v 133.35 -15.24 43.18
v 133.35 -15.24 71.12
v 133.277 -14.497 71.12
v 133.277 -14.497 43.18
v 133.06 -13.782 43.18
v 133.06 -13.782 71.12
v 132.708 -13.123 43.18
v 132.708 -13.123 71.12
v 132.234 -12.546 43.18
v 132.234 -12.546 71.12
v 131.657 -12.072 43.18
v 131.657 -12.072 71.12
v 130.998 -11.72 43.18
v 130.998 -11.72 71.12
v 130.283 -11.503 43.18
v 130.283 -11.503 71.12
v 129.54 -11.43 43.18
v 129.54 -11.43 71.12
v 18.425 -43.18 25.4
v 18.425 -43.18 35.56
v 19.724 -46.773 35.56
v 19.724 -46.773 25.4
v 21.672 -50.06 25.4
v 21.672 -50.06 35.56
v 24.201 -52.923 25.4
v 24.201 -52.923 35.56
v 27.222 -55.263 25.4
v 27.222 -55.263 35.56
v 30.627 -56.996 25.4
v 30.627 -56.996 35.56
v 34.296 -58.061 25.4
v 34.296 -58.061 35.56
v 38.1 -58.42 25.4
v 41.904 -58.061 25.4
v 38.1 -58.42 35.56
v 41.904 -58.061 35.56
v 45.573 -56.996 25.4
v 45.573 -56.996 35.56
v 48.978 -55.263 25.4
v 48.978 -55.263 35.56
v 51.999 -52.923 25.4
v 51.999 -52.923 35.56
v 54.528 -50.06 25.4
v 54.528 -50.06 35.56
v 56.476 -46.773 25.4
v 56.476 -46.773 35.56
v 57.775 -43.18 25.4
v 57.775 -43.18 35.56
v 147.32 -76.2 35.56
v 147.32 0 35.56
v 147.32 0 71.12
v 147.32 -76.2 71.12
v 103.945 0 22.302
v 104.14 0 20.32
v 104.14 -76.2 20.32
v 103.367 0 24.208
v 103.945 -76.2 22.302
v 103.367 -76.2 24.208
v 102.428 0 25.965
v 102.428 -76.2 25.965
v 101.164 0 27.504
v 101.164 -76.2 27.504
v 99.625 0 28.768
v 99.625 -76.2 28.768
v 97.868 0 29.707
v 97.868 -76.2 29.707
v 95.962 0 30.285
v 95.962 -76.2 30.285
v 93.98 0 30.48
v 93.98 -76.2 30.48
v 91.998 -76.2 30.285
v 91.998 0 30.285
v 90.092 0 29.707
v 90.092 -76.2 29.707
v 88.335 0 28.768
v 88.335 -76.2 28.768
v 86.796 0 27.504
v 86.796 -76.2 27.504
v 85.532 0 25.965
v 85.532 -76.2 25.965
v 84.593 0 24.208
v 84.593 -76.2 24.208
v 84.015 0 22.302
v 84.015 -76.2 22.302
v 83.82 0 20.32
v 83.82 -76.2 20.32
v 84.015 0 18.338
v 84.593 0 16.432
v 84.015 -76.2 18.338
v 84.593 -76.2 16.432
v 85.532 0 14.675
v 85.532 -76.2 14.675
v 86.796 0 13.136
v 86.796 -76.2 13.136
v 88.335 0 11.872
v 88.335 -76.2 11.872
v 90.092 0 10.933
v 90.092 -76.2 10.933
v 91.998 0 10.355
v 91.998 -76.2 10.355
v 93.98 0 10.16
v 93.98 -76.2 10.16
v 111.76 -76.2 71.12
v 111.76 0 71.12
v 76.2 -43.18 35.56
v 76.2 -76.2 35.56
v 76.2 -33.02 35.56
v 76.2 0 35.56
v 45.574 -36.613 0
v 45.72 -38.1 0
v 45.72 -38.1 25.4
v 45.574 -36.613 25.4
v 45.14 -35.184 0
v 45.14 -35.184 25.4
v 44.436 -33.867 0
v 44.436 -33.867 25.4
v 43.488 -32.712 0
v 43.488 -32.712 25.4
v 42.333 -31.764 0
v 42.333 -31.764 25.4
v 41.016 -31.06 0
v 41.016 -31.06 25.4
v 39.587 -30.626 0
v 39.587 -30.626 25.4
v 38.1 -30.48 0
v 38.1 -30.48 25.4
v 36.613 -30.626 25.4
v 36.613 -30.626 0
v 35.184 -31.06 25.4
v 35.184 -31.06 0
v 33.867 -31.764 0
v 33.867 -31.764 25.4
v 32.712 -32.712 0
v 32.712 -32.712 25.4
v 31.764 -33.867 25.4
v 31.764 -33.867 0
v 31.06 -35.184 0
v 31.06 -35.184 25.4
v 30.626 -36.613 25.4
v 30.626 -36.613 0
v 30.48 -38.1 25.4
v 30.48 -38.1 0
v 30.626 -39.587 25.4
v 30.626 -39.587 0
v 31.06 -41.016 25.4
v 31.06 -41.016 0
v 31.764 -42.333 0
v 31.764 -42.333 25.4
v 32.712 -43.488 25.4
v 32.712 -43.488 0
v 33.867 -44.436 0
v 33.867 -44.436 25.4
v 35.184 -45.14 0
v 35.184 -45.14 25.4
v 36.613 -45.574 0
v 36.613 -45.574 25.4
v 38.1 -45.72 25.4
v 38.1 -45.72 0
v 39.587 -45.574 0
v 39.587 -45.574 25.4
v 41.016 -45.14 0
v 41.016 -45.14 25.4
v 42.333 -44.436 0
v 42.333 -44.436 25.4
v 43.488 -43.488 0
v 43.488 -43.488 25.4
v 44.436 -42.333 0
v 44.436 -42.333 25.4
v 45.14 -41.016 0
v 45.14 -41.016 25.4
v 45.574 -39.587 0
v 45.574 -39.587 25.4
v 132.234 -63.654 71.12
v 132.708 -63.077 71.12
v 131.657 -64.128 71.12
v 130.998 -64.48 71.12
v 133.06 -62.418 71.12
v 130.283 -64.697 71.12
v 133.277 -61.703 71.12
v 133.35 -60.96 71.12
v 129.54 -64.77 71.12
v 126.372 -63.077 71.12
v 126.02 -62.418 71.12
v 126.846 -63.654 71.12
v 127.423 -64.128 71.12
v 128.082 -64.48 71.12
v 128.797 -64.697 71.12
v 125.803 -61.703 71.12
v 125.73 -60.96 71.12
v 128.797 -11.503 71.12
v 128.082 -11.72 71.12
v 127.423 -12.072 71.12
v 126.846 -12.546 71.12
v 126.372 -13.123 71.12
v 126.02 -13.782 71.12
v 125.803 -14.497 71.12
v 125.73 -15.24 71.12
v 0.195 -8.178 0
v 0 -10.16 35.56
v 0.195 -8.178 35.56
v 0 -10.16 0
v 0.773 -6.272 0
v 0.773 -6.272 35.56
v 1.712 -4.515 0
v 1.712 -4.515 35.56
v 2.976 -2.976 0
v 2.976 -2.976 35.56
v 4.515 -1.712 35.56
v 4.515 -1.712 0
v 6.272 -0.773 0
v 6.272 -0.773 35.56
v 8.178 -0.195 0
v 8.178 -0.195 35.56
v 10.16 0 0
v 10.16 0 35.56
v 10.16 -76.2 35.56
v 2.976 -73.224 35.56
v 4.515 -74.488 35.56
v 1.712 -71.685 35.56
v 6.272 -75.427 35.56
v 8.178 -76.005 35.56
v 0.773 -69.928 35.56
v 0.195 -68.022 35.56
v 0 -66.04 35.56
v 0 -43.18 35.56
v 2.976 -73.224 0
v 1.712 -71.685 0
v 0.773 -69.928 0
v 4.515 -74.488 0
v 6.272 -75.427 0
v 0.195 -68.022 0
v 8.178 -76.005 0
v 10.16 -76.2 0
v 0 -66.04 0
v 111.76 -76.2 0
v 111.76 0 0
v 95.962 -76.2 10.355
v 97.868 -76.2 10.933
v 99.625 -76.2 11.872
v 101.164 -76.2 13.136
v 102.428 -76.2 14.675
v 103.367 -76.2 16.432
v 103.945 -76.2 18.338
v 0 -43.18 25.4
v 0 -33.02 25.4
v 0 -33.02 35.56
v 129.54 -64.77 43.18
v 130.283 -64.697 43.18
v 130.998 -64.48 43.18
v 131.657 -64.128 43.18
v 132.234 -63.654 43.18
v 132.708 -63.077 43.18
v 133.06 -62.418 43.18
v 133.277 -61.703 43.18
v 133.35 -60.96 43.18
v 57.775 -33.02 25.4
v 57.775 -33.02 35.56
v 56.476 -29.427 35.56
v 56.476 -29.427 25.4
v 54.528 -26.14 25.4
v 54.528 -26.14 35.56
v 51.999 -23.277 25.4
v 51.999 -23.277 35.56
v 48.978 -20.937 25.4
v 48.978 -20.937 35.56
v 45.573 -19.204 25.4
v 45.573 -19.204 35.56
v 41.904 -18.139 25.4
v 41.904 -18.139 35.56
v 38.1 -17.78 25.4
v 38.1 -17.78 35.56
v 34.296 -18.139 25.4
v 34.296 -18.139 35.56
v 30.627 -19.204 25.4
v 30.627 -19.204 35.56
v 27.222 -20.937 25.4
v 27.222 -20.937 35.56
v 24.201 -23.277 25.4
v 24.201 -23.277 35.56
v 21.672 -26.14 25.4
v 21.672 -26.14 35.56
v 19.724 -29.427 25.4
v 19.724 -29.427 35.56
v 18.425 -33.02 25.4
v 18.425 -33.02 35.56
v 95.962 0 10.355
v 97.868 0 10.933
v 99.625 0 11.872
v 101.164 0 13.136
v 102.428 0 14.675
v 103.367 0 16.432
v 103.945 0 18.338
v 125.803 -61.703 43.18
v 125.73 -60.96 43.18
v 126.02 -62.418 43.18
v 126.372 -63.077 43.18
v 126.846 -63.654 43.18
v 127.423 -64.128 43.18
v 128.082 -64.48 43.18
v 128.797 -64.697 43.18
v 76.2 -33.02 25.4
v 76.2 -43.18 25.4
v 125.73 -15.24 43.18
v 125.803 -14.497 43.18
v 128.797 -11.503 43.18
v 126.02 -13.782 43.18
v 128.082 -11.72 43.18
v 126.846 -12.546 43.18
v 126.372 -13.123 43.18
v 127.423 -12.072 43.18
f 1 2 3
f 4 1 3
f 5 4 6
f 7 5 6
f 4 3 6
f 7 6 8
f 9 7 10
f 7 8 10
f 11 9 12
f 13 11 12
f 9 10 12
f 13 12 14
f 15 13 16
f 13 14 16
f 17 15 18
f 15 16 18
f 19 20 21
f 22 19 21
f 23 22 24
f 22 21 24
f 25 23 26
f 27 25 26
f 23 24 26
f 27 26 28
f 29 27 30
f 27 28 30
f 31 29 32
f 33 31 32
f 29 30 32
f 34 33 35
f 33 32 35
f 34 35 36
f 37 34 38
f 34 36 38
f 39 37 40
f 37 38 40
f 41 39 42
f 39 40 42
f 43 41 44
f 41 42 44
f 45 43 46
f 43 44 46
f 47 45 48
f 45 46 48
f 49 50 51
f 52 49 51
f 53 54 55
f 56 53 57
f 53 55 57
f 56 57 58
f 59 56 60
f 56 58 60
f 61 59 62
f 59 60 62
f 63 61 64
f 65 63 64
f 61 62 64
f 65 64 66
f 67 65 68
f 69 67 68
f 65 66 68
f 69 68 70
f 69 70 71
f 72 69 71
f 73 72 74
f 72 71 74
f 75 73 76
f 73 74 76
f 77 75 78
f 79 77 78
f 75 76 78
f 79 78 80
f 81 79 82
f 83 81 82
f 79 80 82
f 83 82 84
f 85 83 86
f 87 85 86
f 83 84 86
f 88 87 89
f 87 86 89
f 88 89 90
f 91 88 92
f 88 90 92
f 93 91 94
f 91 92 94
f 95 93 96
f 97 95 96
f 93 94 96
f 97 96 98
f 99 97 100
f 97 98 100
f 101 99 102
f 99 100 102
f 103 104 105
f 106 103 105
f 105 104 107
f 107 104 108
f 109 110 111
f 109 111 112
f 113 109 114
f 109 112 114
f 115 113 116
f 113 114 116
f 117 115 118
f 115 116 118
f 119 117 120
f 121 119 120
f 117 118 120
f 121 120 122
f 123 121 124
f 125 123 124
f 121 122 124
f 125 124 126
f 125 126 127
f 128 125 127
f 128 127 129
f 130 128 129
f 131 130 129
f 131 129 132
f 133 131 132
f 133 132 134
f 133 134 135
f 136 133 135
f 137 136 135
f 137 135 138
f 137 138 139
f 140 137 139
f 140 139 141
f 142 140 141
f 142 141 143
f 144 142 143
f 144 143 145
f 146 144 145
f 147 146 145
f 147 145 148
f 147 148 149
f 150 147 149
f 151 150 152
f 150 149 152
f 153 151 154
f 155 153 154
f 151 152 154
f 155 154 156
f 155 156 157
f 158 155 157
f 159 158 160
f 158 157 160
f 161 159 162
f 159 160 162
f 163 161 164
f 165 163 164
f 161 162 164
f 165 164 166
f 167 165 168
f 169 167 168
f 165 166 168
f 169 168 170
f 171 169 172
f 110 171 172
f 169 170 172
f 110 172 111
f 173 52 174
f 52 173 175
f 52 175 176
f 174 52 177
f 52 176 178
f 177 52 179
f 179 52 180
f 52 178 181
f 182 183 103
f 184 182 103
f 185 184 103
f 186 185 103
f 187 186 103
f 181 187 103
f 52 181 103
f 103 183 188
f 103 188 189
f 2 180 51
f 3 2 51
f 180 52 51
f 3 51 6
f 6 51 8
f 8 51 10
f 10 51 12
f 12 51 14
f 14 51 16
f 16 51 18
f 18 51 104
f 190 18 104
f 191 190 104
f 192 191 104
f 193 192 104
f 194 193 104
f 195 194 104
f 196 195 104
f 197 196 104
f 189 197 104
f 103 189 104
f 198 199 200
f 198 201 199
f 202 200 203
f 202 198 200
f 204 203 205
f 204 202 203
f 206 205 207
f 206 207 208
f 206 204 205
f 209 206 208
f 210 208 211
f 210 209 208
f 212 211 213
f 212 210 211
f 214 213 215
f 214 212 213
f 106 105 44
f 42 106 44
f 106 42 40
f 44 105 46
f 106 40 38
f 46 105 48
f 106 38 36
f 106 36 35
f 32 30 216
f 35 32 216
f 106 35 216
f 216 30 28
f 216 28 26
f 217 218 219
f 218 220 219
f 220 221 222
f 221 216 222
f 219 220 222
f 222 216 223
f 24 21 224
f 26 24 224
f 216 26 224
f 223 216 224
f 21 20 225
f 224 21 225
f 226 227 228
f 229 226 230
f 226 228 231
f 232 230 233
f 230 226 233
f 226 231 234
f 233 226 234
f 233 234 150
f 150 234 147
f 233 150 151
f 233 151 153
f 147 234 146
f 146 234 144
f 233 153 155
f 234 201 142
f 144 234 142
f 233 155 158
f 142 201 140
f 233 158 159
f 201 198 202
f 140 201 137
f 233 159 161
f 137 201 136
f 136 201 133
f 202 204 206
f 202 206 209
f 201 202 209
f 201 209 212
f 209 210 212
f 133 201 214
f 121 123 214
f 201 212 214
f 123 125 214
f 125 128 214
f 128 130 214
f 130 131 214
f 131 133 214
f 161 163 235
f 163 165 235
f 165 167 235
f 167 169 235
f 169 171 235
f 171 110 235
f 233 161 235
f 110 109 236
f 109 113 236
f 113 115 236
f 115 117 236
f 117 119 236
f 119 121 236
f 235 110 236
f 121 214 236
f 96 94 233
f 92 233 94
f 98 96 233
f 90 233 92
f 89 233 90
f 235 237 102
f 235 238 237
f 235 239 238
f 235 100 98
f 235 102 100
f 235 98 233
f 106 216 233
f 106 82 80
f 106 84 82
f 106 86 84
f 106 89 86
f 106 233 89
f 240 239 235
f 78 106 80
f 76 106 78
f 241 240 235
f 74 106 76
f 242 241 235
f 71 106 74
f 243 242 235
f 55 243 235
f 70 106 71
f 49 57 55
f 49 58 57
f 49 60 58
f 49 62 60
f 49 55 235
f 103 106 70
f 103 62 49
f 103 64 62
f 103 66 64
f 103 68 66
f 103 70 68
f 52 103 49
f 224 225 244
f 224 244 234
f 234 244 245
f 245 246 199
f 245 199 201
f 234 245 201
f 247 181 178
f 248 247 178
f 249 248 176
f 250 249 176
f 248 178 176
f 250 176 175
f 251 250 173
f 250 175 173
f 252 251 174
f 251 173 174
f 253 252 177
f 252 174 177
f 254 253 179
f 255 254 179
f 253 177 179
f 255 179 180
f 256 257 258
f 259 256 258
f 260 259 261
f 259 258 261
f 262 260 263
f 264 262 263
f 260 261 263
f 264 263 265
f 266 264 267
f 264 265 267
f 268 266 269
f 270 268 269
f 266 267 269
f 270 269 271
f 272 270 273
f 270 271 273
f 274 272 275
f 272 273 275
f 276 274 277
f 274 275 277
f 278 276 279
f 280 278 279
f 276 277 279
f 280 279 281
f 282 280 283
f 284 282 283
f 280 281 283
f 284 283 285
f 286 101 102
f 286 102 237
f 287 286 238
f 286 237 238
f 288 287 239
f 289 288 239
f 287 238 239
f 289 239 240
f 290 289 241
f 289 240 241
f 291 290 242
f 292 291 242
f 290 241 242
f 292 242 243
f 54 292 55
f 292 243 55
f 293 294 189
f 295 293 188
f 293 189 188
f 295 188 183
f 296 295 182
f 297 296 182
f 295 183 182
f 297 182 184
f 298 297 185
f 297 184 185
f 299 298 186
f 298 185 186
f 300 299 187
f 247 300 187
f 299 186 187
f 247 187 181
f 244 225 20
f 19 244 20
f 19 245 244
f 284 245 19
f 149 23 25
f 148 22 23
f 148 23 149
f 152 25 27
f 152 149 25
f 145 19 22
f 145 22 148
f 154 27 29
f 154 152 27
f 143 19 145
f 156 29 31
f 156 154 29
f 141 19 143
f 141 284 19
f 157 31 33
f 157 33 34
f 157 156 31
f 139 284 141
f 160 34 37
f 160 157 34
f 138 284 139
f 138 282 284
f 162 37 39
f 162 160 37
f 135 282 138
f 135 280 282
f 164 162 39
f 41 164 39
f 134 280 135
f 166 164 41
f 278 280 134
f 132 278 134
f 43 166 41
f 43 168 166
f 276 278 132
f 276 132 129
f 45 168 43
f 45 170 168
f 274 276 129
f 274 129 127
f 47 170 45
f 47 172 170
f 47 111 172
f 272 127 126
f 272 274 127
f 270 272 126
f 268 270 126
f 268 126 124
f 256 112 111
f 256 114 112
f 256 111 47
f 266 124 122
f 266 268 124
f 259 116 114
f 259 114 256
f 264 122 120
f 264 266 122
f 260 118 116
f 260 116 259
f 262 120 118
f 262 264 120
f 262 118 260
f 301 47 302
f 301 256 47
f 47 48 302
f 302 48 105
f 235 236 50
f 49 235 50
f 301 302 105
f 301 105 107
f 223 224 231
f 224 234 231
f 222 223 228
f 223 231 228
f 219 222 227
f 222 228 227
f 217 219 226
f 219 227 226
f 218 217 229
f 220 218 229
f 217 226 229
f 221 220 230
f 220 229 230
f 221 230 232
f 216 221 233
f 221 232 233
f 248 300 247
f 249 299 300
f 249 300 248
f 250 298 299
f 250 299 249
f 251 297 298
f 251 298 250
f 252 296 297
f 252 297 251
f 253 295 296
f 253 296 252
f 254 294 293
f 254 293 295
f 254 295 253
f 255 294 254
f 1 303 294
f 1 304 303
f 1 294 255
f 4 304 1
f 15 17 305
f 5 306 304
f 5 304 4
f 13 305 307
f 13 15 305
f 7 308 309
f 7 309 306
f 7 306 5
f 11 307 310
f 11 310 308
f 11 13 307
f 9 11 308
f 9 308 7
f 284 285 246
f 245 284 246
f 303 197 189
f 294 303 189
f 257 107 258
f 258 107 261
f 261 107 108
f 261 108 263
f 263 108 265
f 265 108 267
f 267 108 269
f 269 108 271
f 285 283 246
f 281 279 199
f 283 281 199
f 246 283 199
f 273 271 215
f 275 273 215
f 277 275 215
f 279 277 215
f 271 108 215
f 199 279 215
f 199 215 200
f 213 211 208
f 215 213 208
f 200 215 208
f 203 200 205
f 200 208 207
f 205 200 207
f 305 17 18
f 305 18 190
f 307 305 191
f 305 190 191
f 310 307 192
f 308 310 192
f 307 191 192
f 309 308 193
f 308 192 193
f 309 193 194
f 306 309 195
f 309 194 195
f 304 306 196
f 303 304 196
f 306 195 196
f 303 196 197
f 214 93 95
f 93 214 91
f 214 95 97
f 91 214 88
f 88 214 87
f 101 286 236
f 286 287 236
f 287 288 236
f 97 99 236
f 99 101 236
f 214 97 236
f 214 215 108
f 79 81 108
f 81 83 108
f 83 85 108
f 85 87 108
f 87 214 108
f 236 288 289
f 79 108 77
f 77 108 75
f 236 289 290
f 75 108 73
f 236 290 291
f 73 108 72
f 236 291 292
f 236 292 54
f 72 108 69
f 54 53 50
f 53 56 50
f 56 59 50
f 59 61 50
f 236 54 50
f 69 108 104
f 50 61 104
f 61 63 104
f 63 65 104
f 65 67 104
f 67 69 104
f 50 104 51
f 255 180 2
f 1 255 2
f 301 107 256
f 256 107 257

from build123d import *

# Parameters (mm, degrees)
F1_DEPTH = 76.2
F3_DEPTH = 177.8
F5_DEPTH = 27.94
F7_DEPTH = 10.16
F8_R     = 7.62
F9_DEPTH = 152.4
F10_R    = 10.16


with BuildPart() as f1:
    # F0 (on Front) → F1 (new body)
    with BuildSketch(Plane.XZ):
        Polygon((0, 35.56), (0, 0), (111.76, 0), (147.32, 35.56), (147.32, 71.12), (111.76, 71.12), (76.2, 35.56), align=None)
    extrude(amount=F1_DEPTH)

    # F2 (on face) → F3 (cut)
    with BuildSketch(Plane.XZ.offset(76.2)):
        with BuildLine():
            ThreePointArc((104.14, 20.32), (101.1642048969, 27.5042048969), (93.98, 30.48))
            Line((93.98, 30.48), (93.98, 20.32))
            Line((93.98, 20.32), (93.98, 10.16))
            ThreePointArc((93.98, 10.16), (101.1642048969, 13.1357951031), (104.14, 20.32))
        make_face()
        with BuildLine():
            Line((93.98, 20.32), (93.98, 30.48))
            ThreePointArc((93.98, 30.48), (83.82, 20.32), (93.98, 10.16))
            Line((93.98, 10.16), (93.98, 20.32))
        make_face()
    extrude(amount=-F3_DEPTH, mode=Mode.SUBTRACT)

    # F4 (on face) → F5 (cut)
    with BuildSketch(Plane.XY.offset(71.12)):
        with BuildLine():
            ThreePointArc((133.35, -15.24), (132.2340768363, -12.5459231637), (129.54, -11.43))
            Line((129.54, -11.43), (129.54, -15.24))
            Line((129.54, -15.24), (133.35, -15.24))
        make_face()
        with BuildLine():
            Line((129.54, -15.24), (129.54, -11.43))
            ThreePointArc((129.54, -11.43), (126.8459231637, -12.5459231637), (125.73, -15.24))
            Line((125.73, -15.24), (129.54, -15.24))
        make_face()
        with BuildLine():
            Line((133.35, -15.24), (129.54, -15.24))
            Line((129.54, -15.24), (129.54, -19.05))
            ThreePointArc((129.54, -19.05), (132.2340768363, -17.9340768363), (133.35, -15.24))
        make_face()
        with BuildLine():
            Line((129.54, -19.05), (129.54, -15.24))
            Line((129.54, -15.24), (125.73, -15.24))
            ThreePointArc((125.73, -15.24), (126.8459231637, -17.9340768363), (129.54, -19.05))
        make_face()
        with BuildLine():
            Line((133.35, -60.96), (133.35, -15.24))
            ThreePointArc((133.35, -15.24), (132.2340768363, -17.9340768363), (129.54, -19.05))
            Line((129.54, -19.05), (129.54, -57.15))
            ThreePointArc((129.54, -57.15), (132.2340768363, -58.2659231637), (133.35, -60.96))
        make_face()
        with BuildLine():
            ThreePointArc((129.54, -19.05), (126.8459231637, -17.9340768363), (125.73, -15.24))
            Line((125.73, -15.24), (125.73, -60.96))
            ThreePointArc((125.73, -60.96), (126.8459231637, -58.2659231637), (129.54, -57.15))
            Line((129.54, -57.15), (129.54, -19.05))
        make_face()
        with BuildLine():
            Line((129.54, -60.96), (133.35, -60.96))
            ThreePointArc((133.35, -60.96), (132.2340768363, -58.2659231637), (129.54, -57.15))
            Line((129.54, -57.15), (129.54, -60.96))
        make_face()
        with BuildLine():
            ThreePointArc((129.54, -64.77), (132.2340768363, -63.6540768363), (133.35, -60.96))
            Line((133.35, -60.96), (129.54, -60.96))
            Line((129.54, -60.96), (129.54, -64.77))
        make_face()
        with BuildLine():
            Line((129.54, -60.96), (125.73, -60.96))
            ThreePointArc((125.73, -60.96), (126.8459231637, -63.6540768363), (129.54, -64.77))
            Line((129.54, -64.77), (129.54, -60.96))
        make_face()
        with BuildLine():
            ThreePointArc((129.54, -57.15), (126.8459231637, -58.2659231637), (125.73, -60.96))
            Line((125.73, -60.96), (129.54, -60.96))
            Line((129.54, -60.96), (129.54, -57.15))
        make_face()
    extrude(amount=-F5_DEPTH, mode=Mode.SUBTRACT)

    # F6 (on face) → F7 (cut)
    with BuildSketch(Plane.XY.offset(35.56)):
        with BuildLine():
            Line((18.4252446013, -33.02), (0, -33.02))
            Line((0, -33.02), (0, -38.1))
            Line((0, -38.1), (17.78, -38.1))
            ThreePointArc((17.78, -38.1), (17.9419565719, -35.5395927768), (18.4252446013, -33.02))
        make_face()
        with BuildLine():
            Line((17.78, -38.1), (0, -38.1))
            Line((0, -38.1), (0, -43.18))
            Line((0, -43.18), (18.4252446013, -43.18))
            ThreePointArc((18.4252446013, -43.18), (17.9419565719, -40.6604072232), (17.78, -38.1))
        make_face()
        with BuildLine():
            ThreePointArc((57.7747553987, -33.02), (38.1, -17.78), (18.4252446013, -33.02))
            Line((18.4252446013, -33.02), (57.7747553987, -33.02))
        make_face()
        with BuildLine():
            Line((57.7747553987, -33.02), (18.4252446013, -33.02))
            ThreePointArc((18.4252446013, -33.02), (17.9419565719, -35.5395927768), (17.78, -38.1))
            Line((17.78, -38.1), (58.42, -38.1))
            ThreePointArc((58.42, -38.1), (58.2580434281, -35.5395927768), (57.7747553987, -33.02))
        make_face()
        with BuildLine():
            Line((58.42, -38.1), (17.78, -38.1))
            ThreePointArc((17.78, -38.1), (17.9419565719, -40.6604072232), (18.4252446013, -43.18))
            Line((18.4252446013, -43.18), (57.7747553987, -43.18))
            ThreePointArc((57.7747553987, -43.18), (58.2580434281, -40.6604072232), (58.42, -38.1))
        make_face()
        with BuildLine():
            Line((76.2, -33.02), (57.7747553987, -33.02))
            ThreePointArc((57.7747553987, -33.02), (58.2580434281, -35.5395927768), (58.42, -38.1))
            Line((58.42, -38.1), (76.2, -38.1))
            Line((76.2, -38.1), (76.2, -33.02))
        make_face()
        with BuildLine():
            Line((57.7747553987, -43.18), (18.4252446013, -43.18))
            ThreePointArc((18.4252446013, -43.18), (38.1, -58.42), (57.7747553987, -43.18))
        make_face()
        with BuildLine():
            Line((76.2, -38.1), (58.42, -38.1))
            ThreePointArc((58.42, -38.1), (58.2580434281, -40.6604072232), (57.7747553987, -43.18))
            Line((57.7747553987, -43.18), (76.2, -43.18))
            Line((76.2, -43.18), (76.2, -38.1))
        make_face()
    extrude(amount=-F7_DEPTH, mode=Mode.SUBTRACT)

    # F8 (on face) → F9 (cut)
    with BuildSketch(Plane.XY.offset(25.4)):
        with Locations((38.1, -38.1)):
            Circle(F8_R)
    extrude(amount=-F9_DEPTH, mode=Mode.SUBTRACT)

    # F10
    f10_edges = [f1.edges().sort_by_distance(p)[0] for p in [
        (0, -76.2, 17.78),
        (0, 0, 17.78),
    ]]
    fillet(f10_edges, radius=F10_R)


solid = f1.part
